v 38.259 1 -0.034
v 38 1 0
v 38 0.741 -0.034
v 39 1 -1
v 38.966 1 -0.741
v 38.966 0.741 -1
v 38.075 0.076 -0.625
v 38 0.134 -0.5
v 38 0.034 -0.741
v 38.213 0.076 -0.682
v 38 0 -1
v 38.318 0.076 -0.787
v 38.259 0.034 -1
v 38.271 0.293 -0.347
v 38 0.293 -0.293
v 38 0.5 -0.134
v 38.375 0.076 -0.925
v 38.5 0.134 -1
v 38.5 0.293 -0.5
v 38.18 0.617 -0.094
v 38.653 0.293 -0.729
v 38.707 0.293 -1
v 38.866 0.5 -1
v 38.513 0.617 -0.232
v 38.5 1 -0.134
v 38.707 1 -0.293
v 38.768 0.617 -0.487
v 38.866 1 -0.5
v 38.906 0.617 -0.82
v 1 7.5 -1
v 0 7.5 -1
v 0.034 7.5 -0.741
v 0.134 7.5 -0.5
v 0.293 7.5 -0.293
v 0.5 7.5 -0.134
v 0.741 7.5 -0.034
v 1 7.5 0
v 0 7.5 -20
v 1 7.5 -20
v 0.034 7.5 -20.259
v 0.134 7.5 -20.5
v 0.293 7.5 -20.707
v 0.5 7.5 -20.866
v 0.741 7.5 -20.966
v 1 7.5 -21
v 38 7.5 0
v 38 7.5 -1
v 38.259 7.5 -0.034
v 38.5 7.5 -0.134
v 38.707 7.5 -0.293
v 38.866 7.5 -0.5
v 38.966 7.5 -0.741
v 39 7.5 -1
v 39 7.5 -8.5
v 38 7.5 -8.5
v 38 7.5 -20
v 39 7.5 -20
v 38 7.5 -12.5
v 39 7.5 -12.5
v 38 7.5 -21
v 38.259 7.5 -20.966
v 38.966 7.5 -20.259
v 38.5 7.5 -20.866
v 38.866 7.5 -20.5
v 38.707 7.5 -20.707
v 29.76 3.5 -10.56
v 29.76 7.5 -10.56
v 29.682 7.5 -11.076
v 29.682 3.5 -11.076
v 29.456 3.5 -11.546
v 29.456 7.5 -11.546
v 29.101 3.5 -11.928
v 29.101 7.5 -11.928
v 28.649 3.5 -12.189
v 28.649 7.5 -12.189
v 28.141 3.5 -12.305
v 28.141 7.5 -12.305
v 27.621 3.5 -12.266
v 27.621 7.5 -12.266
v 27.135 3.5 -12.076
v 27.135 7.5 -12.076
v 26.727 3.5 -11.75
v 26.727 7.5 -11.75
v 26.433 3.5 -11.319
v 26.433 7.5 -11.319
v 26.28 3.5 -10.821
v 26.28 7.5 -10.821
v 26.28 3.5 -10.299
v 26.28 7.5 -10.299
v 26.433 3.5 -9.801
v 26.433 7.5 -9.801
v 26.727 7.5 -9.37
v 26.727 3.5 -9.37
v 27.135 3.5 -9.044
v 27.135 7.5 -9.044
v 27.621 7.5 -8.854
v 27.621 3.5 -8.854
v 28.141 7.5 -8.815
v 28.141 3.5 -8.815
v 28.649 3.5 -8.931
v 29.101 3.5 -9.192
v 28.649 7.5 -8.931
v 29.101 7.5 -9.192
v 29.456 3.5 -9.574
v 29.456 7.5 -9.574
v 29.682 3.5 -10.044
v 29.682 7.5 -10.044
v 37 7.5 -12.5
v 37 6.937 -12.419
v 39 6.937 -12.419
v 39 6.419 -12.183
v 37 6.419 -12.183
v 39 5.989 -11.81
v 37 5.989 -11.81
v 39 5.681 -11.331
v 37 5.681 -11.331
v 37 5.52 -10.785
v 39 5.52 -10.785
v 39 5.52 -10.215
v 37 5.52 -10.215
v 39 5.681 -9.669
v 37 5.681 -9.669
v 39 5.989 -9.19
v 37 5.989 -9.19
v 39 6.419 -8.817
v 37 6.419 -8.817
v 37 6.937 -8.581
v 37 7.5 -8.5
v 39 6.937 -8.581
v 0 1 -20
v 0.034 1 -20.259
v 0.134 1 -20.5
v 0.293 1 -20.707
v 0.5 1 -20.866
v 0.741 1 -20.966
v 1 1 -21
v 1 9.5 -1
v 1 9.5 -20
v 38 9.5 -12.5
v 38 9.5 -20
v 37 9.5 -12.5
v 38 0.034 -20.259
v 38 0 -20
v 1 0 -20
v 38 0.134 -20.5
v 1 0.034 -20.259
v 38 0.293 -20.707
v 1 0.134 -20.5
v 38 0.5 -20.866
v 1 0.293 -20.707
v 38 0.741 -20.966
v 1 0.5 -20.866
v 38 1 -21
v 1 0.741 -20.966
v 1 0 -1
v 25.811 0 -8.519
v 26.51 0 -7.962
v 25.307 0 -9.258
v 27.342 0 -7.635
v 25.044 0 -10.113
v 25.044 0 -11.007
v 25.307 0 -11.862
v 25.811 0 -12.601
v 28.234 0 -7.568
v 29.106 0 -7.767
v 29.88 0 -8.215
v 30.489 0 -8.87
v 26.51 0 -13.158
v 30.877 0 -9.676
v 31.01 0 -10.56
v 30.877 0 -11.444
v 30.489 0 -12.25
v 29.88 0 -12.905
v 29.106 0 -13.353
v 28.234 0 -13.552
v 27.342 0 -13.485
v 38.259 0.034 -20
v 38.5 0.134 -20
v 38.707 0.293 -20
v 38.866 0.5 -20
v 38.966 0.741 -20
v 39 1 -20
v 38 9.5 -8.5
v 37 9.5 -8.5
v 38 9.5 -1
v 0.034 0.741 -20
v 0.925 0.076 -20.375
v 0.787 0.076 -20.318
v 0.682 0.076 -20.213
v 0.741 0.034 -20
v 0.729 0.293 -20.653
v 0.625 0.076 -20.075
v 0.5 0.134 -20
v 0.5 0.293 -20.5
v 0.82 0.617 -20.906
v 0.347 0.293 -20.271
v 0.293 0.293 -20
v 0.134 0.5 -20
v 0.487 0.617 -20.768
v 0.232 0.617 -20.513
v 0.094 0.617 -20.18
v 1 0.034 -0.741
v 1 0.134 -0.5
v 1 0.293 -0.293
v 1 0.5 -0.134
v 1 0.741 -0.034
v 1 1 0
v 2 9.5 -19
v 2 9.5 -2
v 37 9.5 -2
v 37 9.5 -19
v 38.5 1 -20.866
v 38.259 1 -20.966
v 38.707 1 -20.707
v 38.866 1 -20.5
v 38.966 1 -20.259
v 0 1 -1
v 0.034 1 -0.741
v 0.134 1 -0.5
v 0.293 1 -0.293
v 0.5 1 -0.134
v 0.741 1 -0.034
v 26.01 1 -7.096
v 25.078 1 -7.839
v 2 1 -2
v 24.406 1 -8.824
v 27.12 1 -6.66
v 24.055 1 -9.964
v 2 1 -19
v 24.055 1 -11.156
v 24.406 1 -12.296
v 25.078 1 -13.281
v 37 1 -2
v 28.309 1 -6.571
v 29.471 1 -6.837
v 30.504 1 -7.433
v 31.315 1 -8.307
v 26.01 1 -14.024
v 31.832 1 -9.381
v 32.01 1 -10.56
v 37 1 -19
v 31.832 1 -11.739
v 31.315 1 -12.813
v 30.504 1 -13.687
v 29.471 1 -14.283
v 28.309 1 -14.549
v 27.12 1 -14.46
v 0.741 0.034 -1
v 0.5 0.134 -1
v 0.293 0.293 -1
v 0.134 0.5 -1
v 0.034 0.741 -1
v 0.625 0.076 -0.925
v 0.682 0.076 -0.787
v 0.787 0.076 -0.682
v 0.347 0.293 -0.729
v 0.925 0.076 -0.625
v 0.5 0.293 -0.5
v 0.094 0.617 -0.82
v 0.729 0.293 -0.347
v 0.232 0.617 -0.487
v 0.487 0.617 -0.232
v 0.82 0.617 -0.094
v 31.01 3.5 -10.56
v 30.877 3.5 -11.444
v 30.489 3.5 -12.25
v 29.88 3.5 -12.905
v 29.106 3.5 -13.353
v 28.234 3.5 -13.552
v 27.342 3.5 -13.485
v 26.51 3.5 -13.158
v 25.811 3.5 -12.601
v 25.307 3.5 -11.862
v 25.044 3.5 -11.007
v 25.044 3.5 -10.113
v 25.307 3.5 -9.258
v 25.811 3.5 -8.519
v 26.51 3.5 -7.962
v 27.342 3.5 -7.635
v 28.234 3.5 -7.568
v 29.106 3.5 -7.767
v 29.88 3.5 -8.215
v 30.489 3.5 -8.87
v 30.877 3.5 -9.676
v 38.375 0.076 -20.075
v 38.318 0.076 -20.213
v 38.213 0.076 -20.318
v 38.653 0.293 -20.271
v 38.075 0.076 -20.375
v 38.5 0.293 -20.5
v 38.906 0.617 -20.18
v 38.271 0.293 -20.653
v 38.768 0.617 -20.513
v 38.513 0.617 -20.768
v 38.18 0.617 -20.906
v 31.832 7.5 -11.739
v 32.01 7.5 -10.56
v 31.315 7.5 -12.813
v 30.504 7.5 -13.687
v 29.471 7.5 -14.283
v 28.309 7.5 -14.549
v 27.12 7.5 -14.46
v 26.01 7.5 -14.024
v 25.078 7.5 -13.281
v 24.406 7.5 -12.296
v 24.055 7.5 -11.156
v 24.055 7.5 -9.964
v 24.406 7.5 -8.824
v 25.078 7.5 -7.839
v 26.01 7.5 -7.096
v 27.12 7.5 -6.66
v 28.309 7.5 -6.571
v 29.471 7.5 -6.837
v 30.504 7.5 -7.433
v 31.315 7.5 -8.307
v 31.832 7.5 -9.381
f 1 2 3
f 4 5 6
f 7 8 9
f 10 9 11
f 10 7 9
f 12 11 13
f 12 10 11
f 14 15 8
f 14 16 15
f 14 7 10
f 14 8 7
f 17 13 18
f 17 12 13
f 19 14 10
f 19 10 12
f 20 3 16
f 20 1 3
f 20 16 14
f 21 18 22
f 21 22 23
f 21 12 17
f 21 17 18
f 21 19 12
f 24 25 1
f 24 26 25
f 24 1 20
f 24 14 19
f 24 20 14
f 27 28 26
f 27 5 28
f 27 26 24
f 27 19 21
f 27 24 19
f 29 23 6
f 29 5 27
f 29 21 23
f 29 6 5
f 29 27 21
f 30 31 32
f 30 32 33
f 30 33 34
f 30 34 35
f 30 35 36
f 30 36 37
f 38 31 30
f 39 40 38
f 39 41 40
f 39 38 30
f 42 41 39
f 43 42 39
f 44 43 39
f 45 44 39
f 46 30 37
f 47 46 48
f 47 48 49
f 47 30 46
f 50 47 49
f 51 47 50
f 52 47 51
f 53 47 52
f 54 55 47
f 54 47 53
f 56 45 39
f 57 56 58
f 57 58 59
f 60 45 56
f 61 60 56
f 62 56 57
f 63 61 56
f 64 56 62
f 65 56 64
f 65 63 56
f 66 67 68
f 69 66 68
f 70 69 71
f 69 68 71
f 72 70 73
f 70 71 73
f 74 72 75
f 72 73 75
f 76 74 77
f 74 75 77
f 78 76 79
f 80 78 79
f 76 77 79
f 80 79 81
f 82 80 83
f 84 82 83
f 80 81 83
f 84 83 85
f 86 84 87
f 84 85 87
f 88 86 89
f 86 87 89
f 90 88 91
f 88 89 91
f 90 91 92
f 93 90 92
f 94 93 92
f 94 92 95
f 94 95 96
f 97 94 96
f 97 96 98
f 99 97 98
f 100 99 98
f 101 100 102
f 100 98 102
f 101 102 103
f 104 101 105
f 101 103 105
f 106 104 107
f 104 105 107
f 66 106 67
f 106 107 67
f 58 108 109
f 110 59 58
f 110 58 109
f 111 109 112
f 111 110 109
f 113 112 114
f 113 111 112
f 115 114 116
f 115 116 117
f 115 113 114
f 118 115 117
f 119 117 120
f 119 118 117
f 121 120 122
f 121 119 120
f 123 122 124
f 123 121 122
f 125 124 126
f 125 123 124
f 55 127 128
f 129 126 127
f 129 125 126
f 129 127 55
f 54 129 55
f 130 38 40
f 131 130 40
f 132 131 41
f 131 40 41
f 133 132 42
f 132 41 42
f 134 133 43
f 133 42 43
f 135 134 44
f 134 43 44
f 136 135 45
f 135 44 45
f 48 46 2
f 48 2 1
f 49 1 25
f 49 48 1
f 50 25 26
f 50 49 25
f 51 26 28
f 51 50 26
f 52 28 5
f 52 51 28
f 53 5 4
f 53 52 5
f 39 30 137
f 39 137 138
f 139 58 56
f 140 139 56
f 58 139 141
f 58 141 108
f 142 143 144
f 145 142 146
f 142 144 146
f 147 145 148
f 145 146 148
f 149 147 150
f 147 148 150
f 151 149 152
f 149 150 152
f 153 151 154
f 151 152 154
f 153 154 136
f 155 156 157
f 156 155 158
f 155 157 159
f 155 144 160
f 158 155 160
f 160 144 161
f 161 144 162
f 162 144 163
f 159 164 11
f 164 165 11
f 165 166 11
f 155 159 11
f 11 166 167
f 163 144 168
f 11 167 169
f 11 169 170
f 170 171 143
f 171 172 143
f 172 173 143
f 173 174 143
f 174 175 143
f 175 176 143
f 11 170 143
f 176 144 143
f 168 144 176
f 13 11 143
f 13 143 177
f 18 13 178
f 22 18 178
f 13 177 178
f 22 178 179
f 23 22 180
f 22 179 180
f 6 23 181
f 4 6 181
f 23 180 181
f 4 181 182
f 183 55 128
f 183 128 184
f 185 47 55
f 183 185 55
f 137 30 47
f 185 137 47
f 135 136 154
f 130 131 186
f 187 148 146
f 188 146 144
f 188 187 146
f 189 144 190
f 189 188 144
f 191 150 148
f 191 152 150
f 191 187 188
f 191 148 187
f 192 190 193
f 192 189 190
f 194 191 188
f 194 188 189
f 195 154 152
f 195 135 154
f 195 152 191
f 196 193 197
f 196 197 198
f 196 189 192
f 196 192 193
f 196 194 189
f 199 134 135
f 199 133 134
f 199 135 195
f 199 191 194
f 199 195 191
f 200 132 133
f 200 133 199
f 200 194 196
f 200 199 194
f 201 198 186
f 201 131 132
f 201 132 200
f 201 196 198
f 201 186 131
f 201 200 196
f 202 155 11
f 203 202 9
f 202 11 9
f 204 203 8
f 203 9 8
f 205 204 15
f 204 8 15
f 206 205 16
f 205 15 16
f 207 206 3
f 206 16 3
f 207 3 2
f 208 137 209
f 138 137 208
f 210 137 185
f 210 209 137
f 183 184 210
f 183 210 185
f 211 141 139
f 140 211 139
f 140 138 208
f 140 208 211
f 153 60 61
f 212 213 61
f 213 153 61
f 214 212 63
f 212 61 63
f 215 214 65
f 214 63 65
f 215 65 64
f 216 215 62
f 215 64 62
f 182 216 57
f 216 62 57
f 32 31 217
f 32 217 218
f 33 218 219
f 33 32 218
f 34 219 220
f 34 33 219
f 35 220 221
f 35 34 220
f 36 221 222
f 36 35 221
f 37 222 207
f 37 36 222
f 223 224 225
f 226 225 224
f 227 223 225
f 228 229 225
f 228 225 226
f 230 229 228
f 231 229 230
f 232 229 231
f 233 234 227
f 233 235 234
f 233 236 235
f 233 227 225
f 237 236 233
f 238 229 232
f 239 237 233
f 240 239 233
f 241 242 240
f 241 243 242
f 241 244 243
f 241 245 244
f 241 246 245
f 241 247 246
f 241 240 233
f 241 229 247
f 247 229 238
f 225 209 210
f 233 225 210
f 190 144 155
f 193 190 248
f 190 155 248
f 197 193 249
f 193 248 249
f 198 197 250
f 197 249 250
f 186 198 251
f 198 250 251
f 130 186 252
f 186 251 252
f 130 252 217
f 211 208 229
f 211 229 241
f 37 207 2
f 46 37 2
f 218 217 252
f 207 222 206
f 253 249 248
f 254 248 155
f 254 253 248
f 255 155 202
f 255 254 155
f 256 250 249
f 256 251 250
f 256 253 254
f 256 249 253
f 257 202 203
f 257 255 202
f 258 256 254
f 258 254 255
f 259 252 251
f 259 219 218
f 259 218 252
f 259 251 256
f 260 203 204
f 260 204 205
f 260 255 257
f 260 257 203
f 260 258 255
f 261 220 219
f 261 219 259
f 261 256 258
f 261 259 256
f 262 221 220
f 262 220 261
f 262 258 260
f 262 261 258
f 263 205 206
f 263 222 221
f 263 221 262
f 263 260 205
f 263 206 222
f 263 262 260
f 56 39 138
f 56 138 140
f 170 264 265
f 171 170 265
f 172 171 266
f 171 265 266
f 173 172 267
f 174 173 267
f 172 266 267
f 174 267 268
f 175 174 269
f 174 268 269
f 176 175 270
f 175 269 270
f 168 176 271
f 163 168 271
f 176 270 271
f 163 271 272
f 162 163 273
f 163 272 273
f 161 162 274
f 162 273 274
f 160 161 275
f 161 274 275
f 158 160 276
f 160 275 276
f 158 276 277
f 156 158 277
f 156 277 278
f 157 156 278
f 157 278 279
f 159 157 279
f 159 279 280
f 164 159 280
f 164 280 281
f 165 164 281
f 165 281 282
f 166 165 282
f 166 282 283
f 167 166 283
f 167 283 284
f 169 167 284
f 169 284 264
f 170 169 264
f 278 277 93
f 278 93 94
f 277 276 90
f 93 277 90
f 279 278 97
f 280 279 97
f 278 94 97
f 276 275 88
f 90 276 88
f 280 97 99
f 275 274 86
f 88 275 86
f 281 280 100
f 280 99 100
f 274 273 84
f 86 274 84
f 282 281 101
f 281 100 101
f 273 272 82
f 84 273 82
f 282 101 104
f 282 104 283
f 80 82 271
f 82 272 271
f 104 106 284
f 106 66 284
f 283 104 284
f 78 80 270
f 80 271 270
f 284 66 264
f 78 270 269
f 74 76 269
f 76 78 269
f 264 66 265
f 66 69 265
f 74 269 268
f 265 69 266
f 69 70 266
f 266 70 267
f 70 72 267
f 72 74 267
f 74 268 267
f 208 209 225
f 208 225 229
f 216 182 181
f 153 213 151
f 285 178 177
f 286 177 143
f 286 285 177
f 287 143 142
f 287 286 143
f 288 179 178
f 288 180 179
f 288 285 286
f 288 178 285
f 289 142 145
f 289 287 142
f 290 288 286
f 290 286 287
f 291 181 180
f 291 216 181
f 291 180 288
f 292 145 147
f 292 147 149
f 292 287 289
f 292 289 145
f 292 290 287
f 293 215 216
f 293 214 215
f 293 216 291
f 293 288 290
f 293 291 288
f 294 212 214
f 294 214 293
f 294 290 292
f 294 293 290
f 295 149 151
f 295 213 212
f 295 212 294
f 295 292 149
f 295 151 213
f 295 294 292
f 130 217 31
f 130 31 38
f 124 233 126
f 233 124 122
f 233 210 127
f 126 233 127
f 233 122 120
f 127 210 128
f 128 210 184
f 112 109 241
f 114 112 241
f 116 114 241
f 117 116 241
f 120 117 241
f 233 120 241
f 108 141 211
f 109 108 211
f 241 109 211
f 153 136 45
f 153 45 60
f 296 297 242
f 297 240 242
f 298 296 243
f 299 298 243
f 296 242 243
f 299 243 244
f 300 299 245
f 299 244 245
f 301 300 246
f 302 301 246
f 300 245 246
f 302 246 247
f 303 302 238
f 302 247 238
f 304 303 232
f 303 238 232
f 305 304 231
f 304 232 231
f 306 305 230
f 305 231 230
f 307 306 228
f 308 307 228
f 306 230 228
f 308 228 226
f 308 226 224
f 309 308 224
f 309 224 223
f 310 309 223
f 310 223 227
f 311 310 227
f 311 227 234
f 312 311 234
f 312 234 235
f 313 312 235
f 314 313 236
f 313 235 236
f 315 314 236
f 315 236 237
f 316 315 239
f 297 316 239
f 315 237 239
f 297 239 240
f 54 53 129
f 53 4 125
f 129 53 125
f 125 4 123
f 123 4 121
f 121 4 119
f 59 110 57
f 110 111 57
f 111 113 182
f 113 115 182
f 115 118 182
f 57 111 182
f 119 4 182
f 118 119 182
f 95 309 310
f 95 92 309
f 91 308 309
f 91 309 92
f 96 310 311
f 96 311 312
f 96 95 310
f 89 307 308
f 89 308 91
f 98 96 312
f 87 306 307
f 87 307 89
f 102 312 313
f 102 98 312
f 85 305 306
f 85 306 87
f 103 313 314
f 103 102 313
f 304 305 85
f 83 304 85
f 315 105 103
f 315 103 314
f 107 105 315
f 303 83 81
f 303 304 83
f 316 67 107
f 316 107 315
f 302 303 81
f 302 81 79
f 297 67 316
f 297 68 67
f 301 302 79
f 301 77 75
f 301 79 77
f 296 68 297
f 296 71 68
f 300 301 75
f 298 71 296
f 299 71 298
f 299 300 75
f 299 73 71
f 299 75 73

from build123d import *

# Parameters (mm, degrees)
SKETCH1_W           = 39
SKETCH1_H           = 21
BOSS_EXTRUDE1_DEPTH = 7.5
SKETCH2_W           = 37
SKETCH2_H           = 19
CUT_EXTRUDE1_DEPTH  = 6.5
FILLET1_R           = 1
FILLET2_R           = 1
SKETCH3_W           = 37
SKETCH3_H           = 19
BOSS_EXTRUDE2_DEPTH = 8.5
SKETCH4_W           = 35
SKETCH4_H           = 17
CUT_EXTRUDE2_DEPTH  = 8.5
SKETCH5_R           = 4
BOSS_EXTRUDE3_DEPTH = 6.5
SKETCH6_R           = 3
CUT_EXTRUDE3_DEPTH  = 7.5
SKETCH7_R           = 4
BOSS_EXTRUDE4_DEPTH = 4
SKETCH8_R           = 1.75
CUT_EXTRUDE4_DEPTH  = 4
CUT_EXTRUDE5_DEPTH  = 2


with BuildPart() as part:
    # Sketch1 → Boss-Extrude1 (new body)
    with BuildSketch(Plane(origin=(0, 0, 0), x_dir=(1, 0, 0), z_dir=(0, 1, 0))):
        with Locations((19.5, 10.5)):
            Rectangle(SKETCH1_W, SKETCH1_H)
    extrude(amount=BOSS_EXTRUDE1_DEPTH)

    # Sketch2 → Cut-Extrude1 (cut)
    with BuildSketch(Plane(origin=(0, 7.5, 0), x_dir=(1, 0, 0), z_dir=(0, 1, 0))):
        with Locations((19.5, 10.5)):
            Rectangle(SKETCH2_W, SKETCH2_H)
    extrude(amount=-CUT_EXTRUDE1_DEPTH, mode=Mode.SUBTRACT)

    # Fillet1
    fillet1_edges = [part.edges().sort_by_distance(p)[0] for p in [
        (0, 3.75, -21),
        (39, 3.75, -21),
        (39, 3.75, 0),
        (0, 3.75, 0),
    ]]
    fillet(fillet1_edges, radius=FILLET1_R)

    # Fillet2
    fillet2_edges = [part.edges().sort_by_distance(p)[0] for p in [
        (39, 0, -10.5),
        (0, 0, -10.5),
        (19.5, 0, -21),
        (19.5, 0, 0),
        (0.292893219, 0, -0.292893219),
        (0.292893219, 0, -20.707106781),
        (38.707106781, 0, -20.707106781),
        (38.707106781, 0, -0.292893219),
    ]]
    fillet(fillet2_edges, radius=FILLET2_R)

    # Sketch3 → Boss-Extrude2 (add)
    with BuildSketch(Plane(origin=(0, 1, 0), x_dir=(1, 0, 0), z_dir=(0, 1, 0))):
        with Locations((19.5, 10.5)):
            Rectangle(SKETCH3_W, SKETCH3_H)
    extrude(amount=BOSS_EXTRUDE2_DEPTH)

    # Sketch4 → Cut-Extrude2 (cut)
    with BuildSketch(Plane(origin=(0, 9.5, 0), x_dir=(1, 0, 0), z_dir=(0, 1, 0))):
        with Locations((19.5, 10.5)):
            Rectangle(SKETCH4_W, SKETCH4_H)
    extrude(amount=-CUT_EXTRUDE2_DEPTH, mode=Mode.SUBTRACT)

    # Sketch5 → Boss-Extrude3 (add)
    with BuildSketch(Plane(origin=(0, 1, 0), x_dir=(1, 0, 0), z_dir=(0, 1, 0))):
        with Locations((28.01, 10.56)):
            Circle(SKETCH5_R)
    extrude(amount=BOSS_EXTRUDE3_DEPTH)

    # Sketch6 → Cut-Extrude3 (cut)
    with BuildSketch(Plane(origin=(0, 7.5, 0), x_dir=(1, 0, 0), z_dir=(0, 1, 0))):
        with Locations((28.01, 10.56)):
            Circle(SKETCH6_R)
    extrude(amount=-CUT_EXTRUDE3_DEPTH, mode=Mode.SUBTRACT)

    # Sketch7 → Boss-Extrude4 (add)
    with BuildSketch(Plane(origin=(0, 7.5, 0), x_dir=(1, 0, 0), z_dir=(0, 1, 0))):
        with Locations((28.01, 10.56)):
            Circle(SKETCH7_R)
    extrude(amount=-BOSS_EXTRUDE4_DEPTH)

    # Sketch8 → Cut-Extrude4 (cut)
    with BuildSketch(Plane(origin=(0, 7.5, 0), x_dir=(1, 0, 0), z_dir=(0, 1, 0))):
        with Locations((28.01, 10.56)):
            Circle(SKETCH8_R)
    extrude(amount=-CUT_EXTRUDE4_DEPTH, mode=Mode.SUBTRACT)

    # Sketch9 → Cut-Extrude5 (cut)
    with BuildSketch(Plane(origin=(39, 0, 0), x_dir=(0, 0, -1), z_dir=(1, 0, 0))):
        with BuildLine():
            Line((8.5, 7.5), (8.5, 9.5))
            Line((8.5, 9.5), (12.5, 9.5))
            Line((12.5, 9.5), (12.5, 7.5))
            ThreePointArc((12.5, 7.5), (10.5, 5.5), (8.5, 7.5))
        make_face()
    extrude(amount=-CUT_EXTRUDE5_DEPTH, mode=Mode.SUBTRACT)


solid = part.part
